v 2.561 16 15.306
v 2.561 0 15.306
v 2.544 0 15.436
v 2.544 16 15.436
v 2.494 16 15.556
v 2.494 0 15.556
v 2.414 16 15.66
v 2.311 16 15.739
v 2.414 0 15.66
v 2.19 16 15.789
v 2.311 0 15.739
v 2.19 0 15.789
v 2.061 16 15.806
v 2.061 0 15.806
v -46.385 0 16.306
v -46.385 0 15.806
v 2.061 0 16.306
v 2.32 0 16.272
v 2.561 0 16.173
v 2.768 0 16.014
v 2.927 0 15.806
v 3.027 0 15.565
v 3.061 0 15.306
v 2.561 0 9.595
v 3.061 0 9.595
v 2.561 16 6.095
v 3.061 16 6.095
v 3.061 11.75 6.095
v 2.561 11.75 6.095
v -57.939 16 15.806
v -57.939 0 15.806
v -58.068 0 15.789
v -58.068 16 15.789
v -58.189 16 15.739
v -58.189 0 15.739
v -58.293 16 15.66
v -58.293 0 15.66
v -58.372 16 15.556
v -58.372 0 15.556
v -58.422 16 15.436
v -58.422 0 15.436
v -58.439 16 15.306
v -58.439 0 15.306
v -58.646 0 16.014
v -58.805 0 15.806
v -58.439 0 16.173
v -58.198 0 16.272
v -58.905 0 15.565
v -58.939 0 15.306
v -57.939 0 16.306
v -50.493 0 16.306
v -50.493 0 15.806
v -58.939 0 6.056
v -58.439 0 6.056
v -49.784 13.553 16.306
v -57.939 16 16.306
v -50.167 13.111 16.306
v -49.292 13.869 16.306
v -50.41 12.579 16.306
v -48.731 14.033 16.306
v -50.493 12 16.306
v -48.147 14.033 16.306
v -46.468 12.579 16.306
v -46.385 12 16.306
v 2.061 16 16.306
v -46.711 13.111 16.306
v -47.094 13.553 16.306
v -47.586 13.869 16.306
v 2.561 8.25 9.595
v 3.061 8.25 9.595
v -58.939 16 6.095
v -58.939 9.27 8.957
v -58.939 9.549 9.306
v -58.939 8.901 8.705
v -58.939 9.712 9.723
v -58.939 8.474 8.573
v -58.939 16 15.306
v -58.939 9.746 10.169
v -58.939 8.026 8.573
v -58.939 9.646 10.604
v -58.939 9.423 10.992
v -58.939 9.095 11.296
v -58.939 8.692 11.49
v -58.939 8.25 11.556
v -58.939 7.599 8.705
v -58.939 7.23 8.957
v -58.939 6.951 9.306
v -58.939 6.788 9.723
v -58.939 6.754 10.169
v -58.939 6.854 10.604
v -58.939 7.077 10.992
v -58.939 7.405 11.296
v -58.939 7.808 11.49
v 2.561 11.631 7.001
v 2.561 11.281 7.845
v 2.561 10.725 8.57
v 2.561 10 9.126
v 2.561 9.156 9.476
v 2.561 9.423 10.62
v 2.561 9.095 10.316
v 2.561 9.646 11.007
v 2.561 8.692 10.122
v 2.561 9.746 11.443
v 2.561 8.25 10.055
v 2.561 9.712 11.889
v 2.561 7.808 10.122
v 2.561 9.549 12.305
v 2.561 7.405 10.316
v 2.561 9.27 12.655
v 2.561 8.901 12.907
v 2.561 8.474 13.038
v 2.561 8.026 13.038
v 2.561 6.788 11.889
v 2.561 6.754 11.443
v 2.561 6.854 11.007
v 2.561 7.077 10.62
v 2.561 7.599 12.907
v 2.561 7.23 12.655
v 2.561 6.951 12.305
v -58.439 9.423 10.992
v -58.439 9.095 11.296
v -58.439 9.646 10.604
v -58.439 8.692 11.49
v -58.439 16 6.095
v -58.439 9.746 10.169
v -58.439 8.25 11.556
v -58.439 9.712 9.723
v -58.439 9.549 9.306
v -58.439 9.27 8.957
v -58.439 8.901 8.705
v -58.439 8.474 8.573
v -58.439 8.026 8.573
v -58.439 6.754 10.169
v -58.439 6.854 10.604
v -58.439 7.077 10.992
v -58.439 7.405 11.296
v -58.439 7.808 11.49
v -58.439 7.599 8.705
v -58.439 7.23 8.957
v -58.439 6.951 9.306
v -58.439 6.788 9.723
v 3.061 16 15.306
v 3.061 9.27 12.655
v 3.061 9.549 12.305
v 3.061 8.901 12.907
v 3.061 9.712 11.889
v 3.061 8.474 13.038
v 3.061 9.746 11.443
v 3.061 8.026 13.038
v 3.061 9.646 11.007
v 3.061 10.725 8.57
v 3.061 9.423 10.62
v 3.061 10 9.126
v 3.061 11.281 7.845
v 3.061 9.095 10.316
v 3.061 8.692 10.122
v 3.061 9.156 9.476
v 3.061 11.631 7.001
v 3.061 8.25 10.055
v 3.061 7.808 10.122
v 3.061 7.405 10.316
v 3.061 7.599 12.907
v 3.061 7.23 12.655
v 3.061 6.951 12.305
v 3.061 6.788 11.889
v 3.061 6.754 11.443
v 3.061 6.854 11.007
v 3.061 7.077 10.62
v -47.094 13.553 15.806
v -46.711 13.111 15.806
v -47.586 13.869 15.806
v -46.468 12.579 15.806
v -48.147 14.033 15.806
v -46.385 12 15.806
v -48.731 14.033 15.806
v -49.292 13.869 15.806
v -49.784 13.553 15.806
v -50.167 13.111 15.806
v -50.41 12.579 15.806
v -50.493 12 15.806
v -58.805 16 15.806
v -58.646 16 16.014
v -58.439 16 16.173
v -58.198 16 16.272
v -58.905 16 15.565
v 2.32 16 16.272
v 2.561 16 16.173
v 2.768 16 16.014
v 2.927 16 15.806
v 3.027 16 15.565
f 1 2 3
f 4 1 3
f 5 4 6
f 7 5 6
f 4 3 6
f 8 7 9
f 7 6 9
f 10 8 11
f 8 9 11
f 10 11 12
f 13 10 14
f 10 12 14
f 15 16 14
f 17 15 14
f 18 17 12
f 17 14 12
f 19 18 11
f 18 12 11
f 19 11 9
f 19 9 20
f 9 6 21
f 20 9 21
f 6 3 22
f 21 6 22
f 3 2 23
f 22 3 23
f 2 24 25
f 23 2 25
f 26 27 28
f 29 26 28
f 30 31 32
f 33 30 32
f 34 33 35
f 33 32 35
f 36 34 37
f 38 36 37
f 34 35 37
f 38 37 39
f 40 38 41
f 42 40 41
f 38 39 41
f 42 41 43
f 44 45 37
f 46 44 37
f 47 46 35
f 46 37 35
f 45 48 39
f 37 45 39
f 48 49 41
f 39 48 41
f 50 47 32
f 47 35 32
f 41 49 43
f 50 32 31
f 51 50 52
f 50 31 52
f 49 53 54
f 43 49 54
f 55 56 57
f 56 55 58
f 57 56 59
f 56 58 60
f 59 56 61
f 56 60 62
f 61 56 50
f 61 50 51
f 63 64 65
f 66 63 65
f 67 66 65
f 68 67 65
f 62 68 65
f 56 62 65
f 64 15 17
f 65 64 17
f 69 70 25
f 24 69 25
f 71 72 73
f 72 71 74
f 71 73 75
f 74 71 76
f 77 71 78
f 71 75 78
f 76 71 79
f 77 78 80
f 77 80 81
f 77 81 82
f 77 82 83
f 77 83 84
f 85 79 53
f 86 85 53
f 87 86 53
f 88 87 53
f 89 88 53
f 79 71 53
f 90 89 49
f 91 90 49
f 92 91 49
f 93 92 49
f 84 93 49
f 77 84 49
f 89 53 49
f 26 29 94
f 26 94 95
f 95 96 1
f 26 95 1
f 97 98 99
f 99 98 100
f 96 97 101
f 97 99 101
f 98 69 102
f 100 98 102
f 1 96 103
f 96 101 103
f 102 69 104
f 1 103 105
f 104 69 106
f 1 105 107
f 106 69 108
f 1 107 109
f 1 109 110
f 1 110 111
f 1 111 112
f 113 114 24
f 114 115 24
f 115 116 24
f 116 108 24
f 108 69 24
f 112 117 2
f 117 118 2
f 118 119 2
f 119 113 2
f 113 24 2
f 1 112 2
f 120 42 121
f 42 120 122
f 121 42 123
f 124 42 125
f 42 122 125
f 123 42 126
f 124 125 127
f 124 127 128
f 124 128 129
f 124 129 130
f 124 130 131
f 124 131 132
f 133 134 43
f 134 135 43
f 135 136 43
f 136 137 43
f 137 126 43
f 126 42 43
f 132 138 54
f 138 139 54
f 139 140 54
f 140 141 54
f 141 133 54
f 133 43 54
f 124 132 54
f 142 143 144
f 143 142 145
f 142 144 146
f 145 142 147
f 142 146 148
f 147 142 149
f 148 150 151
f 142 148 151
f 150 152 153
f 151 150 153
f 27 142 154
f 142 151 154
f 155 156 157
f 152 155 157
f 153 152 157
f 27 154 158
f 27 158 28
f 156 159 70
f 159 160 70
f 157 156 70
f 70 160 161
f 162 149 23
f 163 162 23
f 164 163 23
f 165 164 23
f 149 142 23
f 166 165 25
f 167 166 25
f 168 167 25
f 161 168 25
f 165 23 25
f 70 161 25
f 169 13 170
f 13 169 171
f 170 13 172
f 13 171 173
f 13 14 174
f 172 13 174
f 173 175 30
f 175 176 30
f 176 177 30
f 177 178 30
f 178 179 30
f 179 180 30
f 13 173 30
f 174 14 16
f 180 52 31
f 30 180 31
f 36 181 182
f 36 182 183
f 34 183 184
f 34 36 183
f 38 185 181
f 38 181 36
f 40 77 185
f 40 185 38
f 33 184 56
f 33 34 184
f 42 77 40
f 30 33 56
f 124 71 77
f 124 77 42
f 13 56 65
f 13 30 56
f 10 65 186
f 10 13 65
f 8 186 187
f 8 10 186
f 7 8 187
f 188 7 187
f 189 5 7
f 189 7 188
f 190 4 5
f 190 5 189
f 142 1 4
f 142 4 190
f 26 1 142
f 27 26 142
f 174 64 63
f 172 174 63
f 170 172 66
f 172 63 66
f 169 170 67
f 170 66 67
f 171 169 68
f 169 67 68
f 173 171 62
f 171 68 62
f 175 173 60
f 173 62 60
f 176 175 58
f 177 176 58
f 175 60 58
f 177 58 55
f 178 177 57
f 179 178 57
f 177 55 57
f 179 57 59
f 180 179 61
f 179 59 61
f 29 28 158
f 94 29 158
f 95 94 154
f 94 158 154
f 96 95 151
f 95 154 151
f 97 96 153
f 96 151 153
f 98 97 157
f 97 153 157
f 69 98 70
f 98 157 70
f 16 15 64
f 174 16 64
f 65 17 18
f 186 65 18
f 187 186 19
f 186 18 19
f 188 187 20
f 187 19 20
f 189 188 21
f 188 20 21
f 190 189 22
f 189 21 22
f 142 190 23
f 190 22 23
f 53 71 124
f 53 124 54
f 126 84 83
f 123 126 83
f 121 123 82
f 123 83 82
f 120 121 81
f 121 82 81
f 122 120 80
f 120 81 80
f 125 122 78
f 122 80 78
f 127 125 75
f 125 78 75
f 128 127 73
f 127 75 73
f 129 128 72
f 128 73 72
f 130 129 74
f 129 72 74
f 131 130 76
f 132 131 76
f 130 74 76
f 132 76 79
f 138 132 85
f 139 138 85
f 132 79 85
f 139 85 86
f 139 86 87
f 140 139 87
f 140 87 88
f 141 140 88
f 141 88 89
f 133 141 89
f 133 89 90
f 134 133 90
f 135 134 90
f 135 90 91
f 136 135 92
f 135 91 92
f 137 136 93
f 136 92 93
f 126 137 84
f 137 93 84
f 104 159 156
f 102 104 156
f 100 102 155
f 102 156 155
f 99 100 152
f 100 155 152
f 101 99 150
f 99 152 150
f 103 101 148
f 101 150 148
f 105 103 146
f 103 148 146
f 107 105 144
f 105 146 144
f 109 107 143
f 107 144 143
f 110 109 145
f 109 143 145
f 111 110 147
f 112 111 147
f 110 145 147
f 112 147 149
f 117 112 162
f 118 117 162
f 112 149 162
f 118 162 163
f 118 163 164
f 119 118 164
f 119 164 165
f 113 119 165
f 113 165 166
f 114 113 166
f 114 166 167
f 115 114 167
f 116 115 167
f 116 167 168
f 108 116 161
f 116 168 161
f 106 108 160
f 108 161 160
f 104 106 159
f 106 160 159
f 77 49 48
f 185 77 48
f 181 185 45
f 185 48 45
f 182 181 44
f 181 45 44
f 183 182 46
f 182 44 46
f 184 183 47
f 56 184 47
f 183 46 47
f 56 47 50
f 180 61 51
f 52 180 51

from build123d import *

# Parameters (mm, degrees)
BRIDA_BASE1_DEPTH     = 16
CROQUIS6_R            = 1.5
CORTAR_EXTRUIR6_DEPTH = 0.5
CROQUIS7_R            = 1.5
CORTAR_EXTRUIR7_DEPTH = 0.5
CORTAR_EXTRUIR8_DEPTH = 10


# Sheet-metal steps are written as plain solids
with BuildPart() as part:
    # Croquis1 → Brida base1 (new body)
    with BuildSketch(Plane(origin=(0, 0, 0), x_dir=(1, 0, 0), z_dir=(0, 1, 0))):
        with BuildLine():
            Line((-58.939086294, 3.693519459), (-58.939086294, -15.306480541))
            ThreePointArc((-58.939086294, -15.306480541), (-58.646193076, -16.013587323), (-57.939086294, -16.306480541))
            Line((-57.939086294, -16.306480541), (2.060913706, -16.306480541))
            ThreePointArc((2.060913706, -16.306480541), (2.768020487, -16.013587323), (3.060913706, -15.306480541))
            Line((3.060913706, -15.306480541), (3.060913706, 3.693519459))
            Line((3.060913706, 3.693519459), (2.560913706, 3.693519459))
            Line((2.560913706, 3.693519459), (2.560913706, -15.306480541))
            ThreePointArc((2.560913706, -15.306480541), (2.414467096, -15.660033932), (2.060913706, -15.806480541))
            Line((2.060913706, -15.806480541), (-57.939086294, -15.806480541))
            ThreePointArc((-57.939086294, -15.806480541), (-58.292639685, -15.660033932), (-58.439086294, -15.306480541))
            Line((-58.439086294, -15.306480541), (-58.439086294, 3.693519459))
            Line((-58.439086294, 3.693519459), (-58.939086294, 3.693519459))
        make_face()
    extrude(amount=BRIDA_BASE1_DEPTH)

    # Croquis6 → Cortar-Extruir6 (cut)
    with BuildSketch(Plane(origin=(3.060913706, 0, 0), x_dir=(0, 0, -1), z_dir=(1, 0, 0))):
        with Locations((-11.555105987, 8.25)):
            Circle(CROQUIS6_R)
        with BuildLine():
            Line((-9.595105987, 8.25), (-9.595105987, 0))
            Line((-9.595105987, 0), (3.693519459, 0))
            Line((3.693519459, 0), (3.693519459, 16))
            Line((3.693519459, 16), (-6.095105987, 16))
            Line((-6.095105987, 16), (-6.095105987, 11.75))
            ThreePointArc((-6.095105987, 11.75), (-8.569979721, 10.724873734), (-9.595105987, 8.25))
        make_face()
    extrude(amount=-CORTAR_EXTRUIR6_DEPTH, mode=Mode.SUBTRACT)

    # Croquis7 → Cortar-Extruir7 (cut)
    with BuildSketch(Plane.ZY.offset(58.939086294)):
        with Locations((10.056480541, 8.25)):
            Circle(CROQUIS7_R)
        Polygon((6.095105987, 16), (6.056480541, 0), (-3.693519459, 0), (-3.693519459, 16), align=None)
    extrude(amount=-CORTAR_EXTRUIR7_DEPTH, mode=Mode.SUBTRACT)

    # Croquis8 → Cortar-Extruir8 (cut)
    with BuildSketch(Plane.XY.offset(16.306480541)):
        with BuildLine():
            Line((-50.493414499, 12), (-50.493414499, 3.818786101))
            Line((-50.493414499, 3.818786101), (-50.493414499, 0))
            Line((-50.493414499, 0), (-46.38475809, 0))
            Line((-46.38475809, 0), (-46.38475809, 3.818786101))
            Line((-46.38475809, 3.818786101), (-46.38475809, 12))
            ThreePointArc((-46.38475809, 12), (-48.439086294, 14.054328205), (-50.493414499, 12))
        make_face()
    extrude(amount=-CORTAR_EXTRUIR8_DEPTH, mode=Mode.SUBTRACT)


solid = part.part
